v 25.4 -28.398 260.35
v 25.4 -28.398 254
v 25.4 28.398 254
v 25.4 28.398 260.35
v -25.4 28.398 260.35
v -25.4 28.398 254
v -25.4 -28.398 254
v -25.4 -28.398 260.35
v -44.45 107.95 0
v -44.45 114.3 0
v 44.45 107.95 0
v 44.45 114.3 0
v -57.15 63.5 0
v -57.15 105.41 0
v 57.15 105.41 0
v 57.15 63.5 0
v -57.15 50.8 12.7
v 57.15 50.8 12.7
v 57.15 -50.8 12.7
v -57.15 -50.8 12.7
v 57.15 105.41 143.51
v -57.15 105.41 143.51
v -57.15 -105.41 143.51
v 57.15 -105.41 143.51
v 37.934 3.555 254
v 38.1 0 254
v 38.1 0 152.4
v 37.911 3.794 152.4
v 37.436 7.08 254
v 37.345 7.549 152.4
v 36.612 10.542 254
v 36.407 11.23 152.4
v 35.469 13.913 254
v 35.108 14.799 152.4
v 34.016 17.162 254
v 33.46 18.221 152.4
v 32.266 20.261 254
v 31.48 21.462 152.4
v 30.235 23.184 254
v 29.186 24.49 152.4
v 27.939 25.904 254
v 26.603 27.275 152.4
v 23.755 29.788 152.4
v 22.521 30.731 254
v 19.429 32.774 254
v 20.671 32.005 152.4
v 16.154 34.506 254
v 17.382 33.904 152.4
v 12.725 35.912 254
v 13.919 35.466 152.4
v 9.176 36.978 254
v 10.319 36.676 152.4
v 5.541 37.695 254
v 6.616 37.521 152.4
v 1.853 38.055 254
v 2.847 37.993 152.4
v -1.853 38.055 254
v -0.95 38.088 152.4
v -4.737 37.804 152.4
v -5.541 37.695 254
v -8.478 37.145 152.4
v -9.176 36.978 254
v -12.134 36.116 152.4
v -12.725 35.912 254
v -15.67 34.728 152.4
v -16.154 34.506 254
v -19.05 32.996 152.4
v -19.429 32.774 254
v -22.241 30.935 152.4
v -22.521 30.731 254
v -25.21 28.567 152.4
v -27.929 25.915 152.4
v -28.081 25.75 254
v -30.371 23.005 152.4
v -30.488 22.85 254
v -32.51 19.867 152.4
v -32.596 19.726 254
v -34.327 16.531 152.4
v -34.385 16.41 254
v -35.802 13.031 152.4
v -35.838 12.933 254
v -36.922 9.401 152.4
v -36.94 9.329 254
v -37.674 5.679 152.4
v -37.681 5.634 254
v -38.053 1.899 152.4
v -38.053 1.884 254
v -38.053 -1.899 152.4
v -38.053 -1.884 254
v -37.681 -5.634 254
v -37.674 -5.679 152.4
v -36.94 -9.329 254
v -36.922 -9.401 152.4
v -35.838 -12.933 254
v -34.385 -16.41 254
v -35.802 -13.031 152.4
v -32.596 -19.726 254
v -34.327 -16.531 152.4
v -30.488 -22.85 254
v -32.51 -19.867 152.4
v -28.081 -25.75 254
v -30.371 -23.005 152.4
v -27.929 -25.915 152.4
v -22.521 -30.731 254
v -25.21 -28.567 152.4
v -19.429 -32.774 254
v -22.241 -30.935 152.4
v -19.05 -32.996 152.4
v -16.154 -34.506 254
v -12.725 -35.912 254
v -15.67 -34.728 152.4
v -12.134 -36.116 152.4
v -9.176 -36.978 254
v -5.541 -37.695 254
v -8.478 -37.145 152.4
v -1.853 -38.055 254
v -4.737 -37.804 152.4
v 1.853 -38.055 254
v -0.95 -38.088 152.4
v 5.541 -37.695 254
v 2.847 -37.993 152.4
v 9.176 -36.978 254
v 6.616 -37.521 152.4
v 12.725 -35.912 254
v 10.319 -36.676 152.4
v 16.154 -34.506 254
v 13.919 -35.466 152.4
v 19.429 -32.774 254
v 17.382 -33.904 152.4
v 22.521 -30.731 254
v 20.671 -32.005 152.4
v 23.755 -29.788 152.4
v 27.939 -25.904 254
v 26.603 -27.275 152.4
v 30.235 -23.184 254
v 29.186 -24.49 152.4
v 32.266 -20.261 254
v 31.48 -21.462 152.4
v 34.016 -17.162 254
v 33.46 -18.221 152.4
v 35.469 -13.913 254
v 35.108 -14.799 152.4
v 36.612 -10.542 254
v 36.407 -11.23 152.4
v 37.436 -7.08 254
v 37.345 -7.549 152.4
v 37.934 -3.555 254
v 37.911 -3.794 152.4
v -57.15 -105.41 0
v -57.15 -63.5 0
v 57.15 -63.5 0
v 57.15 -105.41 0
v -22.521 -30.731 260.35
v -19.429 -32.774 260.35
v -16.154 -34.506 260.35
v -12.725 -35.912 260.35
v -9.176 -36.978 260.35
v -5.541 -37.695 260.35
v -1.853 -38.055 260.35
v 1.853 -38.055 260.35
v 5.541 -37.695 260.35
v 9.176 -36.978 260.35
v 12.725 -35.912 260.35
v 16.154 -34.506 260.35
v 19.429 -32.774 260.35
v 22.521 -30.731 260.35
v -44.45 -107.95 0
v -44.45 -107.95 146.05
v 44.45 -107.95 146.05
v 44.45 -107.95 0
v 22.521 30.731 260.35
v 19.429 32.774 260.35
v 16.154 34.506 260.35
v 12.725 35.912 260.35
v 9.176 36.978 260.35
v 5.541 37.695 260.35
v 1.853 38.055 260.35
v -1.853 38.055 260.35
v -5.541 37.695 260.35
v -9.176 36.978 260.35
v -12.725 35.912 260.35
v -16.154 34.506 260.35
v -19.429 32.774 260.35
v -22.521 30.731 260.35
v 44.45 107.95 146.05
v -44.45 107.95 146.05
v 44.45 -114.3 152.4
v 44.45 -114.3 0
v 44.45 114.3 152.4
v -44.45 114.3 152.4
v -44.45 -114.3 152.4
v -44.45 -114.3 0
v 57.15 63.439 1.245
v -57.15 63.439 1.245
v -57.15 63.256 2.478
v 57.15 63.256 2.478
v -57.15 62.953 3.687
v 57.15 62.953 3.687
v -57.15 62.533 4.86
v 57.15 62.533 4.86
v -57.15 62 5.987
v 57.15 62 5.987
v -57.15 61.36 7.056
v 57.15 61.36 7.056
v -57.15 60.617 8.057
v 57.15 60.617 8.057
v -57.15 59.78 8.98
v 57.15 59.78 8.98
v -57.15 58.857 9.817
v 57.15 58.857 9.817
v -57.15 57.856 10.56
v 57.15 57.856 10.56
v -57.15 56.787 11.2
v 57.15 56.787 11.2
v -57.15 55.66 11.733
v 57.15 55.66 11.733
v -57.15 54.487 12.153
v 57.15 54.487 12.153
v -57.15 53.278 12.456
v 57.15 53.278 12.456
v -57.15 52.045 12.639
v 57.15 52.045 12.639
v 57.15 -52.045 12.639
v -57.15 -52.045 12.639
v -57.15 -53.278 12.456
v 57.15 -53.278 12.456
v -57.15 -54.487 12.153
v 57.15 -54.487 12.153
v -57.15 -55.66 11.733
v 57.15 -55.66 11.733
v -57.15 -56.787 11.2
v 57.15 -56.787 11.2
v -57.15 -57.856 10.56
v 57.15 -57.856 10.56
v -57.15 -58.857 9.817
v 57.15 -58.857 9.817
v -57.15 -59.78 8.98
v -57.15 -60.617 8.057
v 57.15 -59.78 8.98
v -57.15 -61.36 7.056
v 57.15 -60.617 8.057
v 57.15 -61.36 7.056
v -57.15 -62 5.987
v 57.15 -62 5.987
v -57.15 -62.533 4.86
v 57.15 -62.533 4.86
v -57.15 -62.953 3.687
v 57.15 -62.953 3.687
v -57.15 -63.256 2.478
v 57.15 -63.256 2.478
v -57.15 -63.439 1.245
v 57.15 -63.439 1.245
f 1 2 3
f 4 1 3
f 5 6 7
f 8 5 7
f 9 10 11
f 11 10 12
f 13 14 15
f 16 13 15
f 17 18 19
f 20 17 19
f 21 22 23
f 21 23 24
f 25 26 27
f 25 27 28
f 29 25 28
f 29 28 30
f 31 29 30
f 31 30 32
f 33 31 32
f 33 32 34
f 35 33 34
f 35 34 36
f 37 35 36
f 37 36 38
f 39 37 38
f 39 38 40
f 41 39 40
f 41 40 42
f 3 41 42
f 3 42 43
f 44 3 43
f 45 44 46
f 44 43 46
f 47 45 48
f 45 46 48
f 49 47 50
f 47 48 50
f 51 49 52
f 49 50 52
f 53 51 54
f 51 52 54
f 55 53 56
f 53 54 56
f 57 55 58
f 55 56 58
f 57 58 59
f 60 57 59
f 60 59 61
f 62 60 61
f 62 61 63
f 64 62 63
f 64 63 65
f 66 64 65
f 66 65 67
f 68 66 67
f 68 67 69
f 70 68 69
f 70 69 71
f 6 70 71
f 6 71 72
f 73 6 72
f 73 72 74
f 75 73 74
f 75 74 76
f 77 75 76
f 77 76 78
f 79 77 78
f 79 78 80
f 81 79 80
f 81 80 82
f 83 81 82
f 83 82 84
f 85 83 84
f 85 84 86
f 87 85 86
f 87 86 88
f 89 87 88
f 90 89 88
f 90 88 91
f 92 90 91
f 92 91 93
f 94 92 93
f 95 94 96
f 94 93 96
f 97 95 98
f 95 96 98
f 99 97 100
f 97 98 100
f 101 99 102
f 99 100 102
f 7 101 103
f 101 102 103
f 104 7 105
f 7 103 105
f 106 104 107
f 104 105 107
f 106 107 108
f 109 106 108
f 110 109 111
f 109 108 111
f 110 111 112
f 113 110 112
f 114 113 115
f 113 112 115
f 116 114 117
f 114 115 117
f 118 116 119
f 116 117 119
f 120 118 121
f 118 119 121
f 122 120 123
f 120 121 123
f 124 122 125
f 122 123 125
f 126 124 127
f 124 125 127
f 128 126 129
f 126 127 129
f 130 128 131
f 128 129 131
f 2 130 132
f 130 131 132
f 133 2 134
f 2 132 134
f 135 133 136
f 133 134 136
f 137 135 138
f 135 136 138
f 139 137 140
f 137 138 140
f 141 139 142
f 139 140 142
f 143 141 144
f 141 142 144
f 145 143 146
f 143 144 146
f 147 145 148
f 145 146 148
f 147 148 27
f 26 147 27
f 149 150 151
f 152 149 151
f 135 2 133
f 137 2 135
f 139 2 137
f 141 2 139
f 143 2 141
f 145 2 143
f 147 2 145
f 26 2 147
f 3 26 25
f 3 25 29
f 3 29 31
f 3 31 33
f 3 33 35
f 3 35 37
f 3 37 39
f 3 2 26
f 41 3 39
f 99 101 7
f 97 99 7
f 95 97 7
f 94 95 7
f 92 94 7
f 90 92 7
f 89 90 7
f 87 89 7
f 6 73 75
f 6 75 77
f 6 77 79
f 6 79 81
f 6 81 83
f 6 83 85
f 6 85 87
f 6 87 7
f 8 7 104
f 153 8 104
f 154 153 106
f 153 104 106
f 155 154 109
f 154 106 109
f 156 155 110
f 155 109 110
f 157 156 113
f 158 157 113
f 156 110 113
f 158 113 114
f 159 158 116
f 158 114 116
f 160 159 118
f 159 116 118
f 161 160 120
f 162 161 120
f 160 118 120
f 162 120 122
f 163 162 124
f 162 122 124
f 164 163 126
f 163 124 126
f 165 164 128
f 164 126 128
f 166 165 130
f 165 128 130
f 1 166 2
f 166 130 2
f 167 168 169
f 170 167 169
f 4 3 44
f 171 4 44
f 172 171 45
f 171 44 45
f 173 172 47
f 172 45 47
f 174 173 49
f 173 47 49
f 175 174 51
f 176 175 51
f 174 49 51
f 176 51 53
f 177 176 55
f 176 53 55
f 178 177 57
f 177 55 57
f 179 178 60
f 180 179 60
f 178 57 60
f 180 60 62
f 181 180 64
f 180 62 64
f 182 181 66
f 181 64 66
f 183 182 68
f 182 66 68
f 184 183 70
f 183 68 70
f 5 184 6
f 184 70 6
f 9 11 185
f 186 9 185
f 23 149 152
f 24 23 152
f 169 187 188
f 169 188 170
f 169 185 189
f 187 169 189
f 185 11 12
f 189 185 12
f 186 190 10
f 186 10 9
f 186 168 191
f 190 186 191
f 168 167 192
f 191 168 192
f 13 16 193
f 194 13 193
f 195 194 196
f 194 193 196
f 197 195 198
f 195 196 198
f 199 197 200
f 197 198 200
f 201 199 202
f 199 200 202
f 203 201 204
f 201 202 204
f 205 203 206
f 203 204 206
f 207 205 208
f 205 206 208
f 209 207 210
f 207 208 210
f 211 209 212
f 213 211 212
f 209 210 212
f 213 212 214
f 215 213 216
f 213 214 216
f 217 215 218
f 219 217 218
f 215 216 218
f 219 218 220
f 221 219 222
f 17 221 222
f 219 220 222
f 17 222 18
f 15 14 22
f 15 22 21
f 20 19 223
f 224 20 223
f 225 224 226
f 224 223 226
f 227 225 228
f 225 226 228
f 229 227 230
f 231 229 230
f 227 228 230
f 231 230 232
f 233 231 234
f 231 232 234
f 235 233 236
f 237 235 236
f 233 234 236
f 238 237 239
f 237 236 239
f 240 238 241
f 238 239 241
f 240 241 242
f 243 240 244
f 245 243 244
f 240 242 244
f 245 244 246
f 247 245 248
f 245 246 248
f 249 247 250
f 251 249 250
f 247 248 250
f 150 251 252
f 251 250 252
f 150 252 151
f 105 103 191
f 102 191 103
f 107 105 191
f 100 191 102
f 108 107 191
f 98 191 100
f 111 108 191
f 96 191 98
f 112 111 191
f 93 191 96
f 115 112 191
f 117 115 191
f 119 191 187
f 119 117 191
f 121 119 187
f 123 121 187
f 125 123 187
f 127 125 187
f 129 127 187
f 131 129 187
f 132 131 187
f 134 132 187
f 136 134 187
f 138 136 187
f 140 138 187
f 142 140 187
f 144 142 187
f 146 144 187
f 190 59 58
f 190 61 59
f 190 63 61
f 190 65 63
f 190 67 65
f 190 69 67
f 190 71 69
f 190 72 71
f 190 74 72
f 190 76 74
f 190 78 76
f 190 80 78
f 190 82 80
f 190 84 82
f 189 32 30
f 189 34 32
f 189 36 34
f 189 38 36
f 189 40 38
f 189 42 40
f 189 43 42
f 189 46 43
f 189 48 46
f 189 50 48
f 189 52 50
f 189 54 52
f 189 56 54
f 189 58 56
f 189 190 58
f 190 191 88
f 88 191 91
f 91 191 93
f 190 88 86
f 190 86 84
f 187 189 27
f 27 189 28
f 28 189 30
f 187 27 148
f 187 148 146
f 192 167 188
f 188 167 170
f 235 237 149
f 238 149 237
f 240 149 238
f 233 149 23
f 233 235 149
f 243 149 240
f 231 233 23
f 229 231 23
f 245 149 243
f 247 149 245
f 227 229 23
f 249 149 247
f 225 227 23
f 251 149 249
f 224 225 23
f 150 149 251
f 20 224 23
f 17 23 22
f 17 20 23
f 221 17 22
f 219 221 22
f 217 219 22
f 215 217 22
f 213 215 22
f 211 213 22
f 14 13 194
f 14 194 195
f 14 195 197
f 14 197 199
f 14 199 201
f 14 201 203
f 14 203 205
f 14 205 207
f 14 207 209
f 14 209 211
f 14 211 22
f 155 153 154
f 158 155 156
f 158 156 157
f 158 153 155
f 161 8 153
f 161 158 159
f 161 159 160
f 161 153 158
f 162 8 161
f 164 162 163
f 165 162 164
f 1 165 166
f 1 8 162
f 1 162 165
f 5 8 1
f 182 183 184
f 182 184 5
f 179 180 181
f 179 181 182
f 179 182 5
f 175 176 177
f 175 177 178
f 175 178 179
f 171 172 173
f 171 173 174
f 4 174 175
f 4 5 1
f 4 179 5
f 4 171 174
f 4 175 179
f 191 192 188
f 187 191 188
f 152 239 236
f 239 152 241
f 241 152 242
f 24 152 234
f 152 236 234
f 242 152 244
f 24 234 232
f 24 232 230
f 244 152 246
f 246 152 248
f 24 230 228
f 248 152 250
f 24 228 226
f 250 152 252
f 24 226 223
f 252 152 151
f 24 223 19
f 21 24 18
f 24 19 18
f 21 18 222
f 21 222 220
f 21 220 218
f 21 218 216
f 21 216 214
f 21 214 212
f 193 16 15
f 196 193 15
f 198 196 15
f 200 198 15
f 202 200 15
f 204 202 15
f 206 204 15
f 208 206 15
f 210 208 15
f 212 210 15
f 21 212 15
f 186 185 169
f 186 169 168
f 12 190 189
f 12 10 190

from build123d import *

# Parameters (mm, degrees)
F0_W      = 114.3
F0_H      = 210.82
F1_DEPTH  = 143.51
F2_W      = 88.9
F2_H      = 210.82
F2_H_2    = 8.89
F3_DEPTH  = 8.89
F4_W      = 88.9
F4_H      = 2.54
F5_DEPTH  = 228.6
F6_W      = 88.9
F6_H      = 6.35
F7_DEPTH  = 152.4
F8_W      = 2.54
F8_H      = 2.54
F9_DEPTH  = 88.9
F10_R     = 38.1
F11_DEPTH = 101.6
F13_DEPTH = 6.35
F15_DEPTH = 114.3


with BuildPart() as f1:
    # F0 (on Top) → F1 (new body)
    with BuildSketch(Plane.XY):
        Rectangle(F0_W, F0_H)
    extrude(amount=F1_DEPTH)

    # F2 (on face) → F3 (join)
    with BuildSketch(Plane.XY.offset(143.51)):
        Rectangle(F2_W, F2_H)
        with Locations((0, 109.855)):
            Rectangle(F2_W, F2_H_2)
        with Locations((0, -109.855)):
            Rectangle(F2_W, F2_H_2)
    extrude(amount=F3_DEPTH)

    # F4 (on face) → F5 (cut)
    with BuildSketch(Plane(origin=(0, 105.41, 0), x_dir=(-1, 0, 0), z_dir=(0, 1, 0))):
        with Locations((0, 144.78)):
            Rectangle(F4_W, F4_H)
    extrude(amount=-F5_DEPTH, mode=Mode.SUBTRACT)

    # F6 (on face) → F7 (join)
    with BuildSketch(Plane.XY.offset(152.4)):
        with Locations((0, 111.125)):
            Rectangle(F6_W, F6_H)
        with Locations((0, -111.125)):
            Rectangle(F6_W, F6_H)
    extrude(amount=-F7_DEPTH)

    # F8 (on face) → F9 (cut)
    with BuildSketch(Plane.YZ.offset(44.45)):
        with Locations((106.68, 144.78)):
            Rectangle(F8_W, F8_H)
    extrude(amount=-F9_DEPTH, mode=Mode.SUBTRACT)

    # F10 (on face) → F11 (join)
    with BuildSketch(Plane.XY.offset(152.4)):
        Circle(F10_R)
    extrude(amount=F11_DEPTH)

    # F12 (on face) → F13 (join)
    with BuildSketch(Plane.XY.offset(254)):
        with BuildLine():
            ThreePointArc((25.4, 28.3980633142), (0, 38.1), (-25.4, 28.3980633142))
            Line((-25.4, 28.3980633142), (-25.4, -28.3980633142))
            ThreePointArc((-25.4, -28.3980633142), (0, -38.1), (25.4, -28.3980633142))
            Line((25.4, -28.3980633142), (25.4, 28.3980633142))
        make_face()
    extrude(amount=F13_DEPTH)

    # F14 (on face) → F15 (cut)
    with BuildSketch(Plane.YZ.offset(57.15)):
        with BuildLine():
            ThreePointArc((-50.8, 12.7), (-59.7802561211, 8.9802561211), (-63.5, 0))
            Line((-63.5, 0), (63.5, 0))
            ThreePointArc((63.5, 0), (59.7802561211, 8.9802561211), (50.8, 12.7))
            Line((50.8, 12.7), (-50.8, 12.7))
        make_face()
    extrude(amount=-F15_DEPTH, mode=Mode.SUBTRACT)


solid = f1.part
